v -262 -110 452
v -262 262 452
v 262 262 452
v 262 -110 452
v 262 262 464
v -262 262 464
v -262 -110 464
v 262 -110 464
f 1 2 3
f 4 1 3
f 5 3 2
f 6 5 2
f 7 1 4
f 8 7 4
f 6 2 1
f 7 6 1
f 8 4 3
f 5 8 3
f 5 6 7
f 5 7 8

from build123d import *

# Parameters (mm, degrees)
F0_W      = 500
F0_H      = 500
F1_DEPTH  = 12
F2_W      = 500
F2_H      = 50
F3_DEPTH  = 6
F6_DEPTH  = 6
F14_DEPTH = 6
F15_R     = 19.99999
F19_DEPTH = 6
F22_DEPTH = 12
F25_DEPTH = 6
F27_W     = 12
F27_H     = 320
F28_DEPTH = 44
F31_W     = 196
F31_H     = 12
F32_DEPTH = 44
F37_DEPTH = 3
F43_DEPTH = 12


# Not quite as in the source:
# - a fillet or chamfer is up to 0.001 mm smaller than in the source, because OpenCascade refuses the exact size


with BuildPart() as f1:
    # F0 (on Top) → F1 (new body)
    with BuildSketch(Plane.XY):
        Rectangle(F0_W, F0_H)
    extrude(amount=F1_DEPTH)


with BuildPart() as f3:
    # F2 (on Right) → F3 (new body, symmetric)
    with BuildSketch(Plane.YZ):
        Rectangle(F2_W, F2_H)
    extrude(amount=F3_DEPTH, both=True)


with BuildPart() as f3_1:
    # F4: moved
    add(f3.part.moved(Location((0, 0, -25))))


with BuildPart() as f6:
    # F5 (on Front) → F6 (new body, symmetric)
    with BuildSketch(Plane.XZ):
        Polygon((-250, -25), (250, -25), (250, 25), (6, 25), (6, 0), (-6, 0), (-6, 25), (-250, 25), align=None)
    extrude(amount=F6_DEPTH, both=True)


with BuildPart() as f6_1:
    # F7: moved
    add(f6.part.moved(Location((0, 80, -25))))


with BuildPart() as f8_1:
    # F8: copy of F6
    add(f6_1.part)


with BuildPart() as f3_2:
    add(f3_1.part)

    # F10: cut F6
    add(f6_1.part, mode=Mode.SUBTRACT)


with BuildPart() as f11_1:
    # F11: copy of F6
    add(f6_1.part.moved(Location((0, 164, 0))))


with BuildPart() as f3_3:
    add(f3_2.part)

    # F12: cut F11_1
    add(f11_1.part, mode=Mode.SUBTRACT)


with BuildPart() as f14:
    # F13 (on Right) → F14 (new body, symmetric)
    with BuildSketch(Plane.YZ):
        Polygon((250, -50), (250, 0), (250, 452), (70, 452), (-110, 452), (-250, 100), (-250, -50), align=None)
        Polygon((0, 412), (70, 412), (140, 412), (140, 372), (0, 372), align=None, mode=Mode.SUBTRACT)
    extrude(amount=F14_DEPTH, both=True)

    # F15 (radius 20 in the source; OpenCascade refuses exactly that, so slightly less here)
    f15_edges = [f14.edges().sort_by_distance(p)[0] for p in [
        (0, 140, 372),
        (0, 140, 412),
        (0, 0, 412),
        (0, 0, 372),
    ]]
    fillet(f15_edges, radius=F15_R)


with BuildPart() as f14_1:
    # F16: moved
    add(f14.part.moved(Location((-256, 0, 0))))


with BuildPart() as f17_1:
    # F17: copy of F14
    add(f14_1.part.moved(Location((512, 0, 0))))


with BuildPart() as f19:
    # F18 (on Front) → F19 (new body, symmetric)
    with BuildSketch(Plane.XZ):
        Polygon((-262, 452), (-262, 0), (-262, -50), (262, -50), (262, 452), align=None)
    extrude(amount=F19_DEPTH, both=True)


with BuildPart() as f19_1:
    # F20: moved
    add(f19.part.moved(Location((0, 256, 0))))


with BuildPart() as f22:
    # F21 (on face) → F22 (new body)
    with BuildSketch(Plane.XY.offset(12)):
        Polygon((262, 262), (0, 262), (-262, 262), (-262, -110), (262, -110), align=None)
    extrude(amount=F22_DEPTH)


with BuildPart() as f22_1:
    # F23: moved
    add(f22.part.moved(Location((0, 0, 440))))


with BuildPart() as f25:
    # F24 (on Front) → F25 (new body, symmetric)
    with BuildSketch(Plane.XZ):
        Polygon((-250, 12), (0, 12), (250, 12), (250, 100), (-250, 100), align=None)
    extrude(amount=F25_DEPTH, both=True)


with BuildPart() as f25_1:
    # F26: moved
    add(f25.part.moved(Location((0, -244, 0))))


with BuildPart() as f28:
    # F27 (on Top) → F28 (new body)
    with BuildSketch(Plane.XY):
        with Locations((-24, -90)):
            Rectangle(F27_W, F27_H)
    extrude(amount=F28_DEPTH)


with BuildPart() as f28_1:
    # F29: moved
    add(f28.part.moved(Location((0, 0, -48))))


with BuildPart() as f30_1:
    # F30: copy of F28
    add(f28_1.part.moved(Location((-208, 0, 0))))


with BuildPart() as f32:
    # F31 (on Top) → F32 (new body)
    with BuildSketch(Plane.XY):
        with Locations((-128, -244)):
            Rectangle(F31_W, F31_H)
    extrude(amount=-F32_DEPTH)


with BuildPart() as f32_1:
    # F33: moved
    add(f32.part.moved(Location((0, 0, -4))))


with BuildPart() as f34_1:
    # F34: copy of F32
    add(f32_1.part.moved(Location((0, 308, 0))))


with BuildPart() as f35_1:
    # F35: copy of F32
    add(f32_1.part.moved(Location((256, 0, 0))))


with BuildPart() as f35_2:
    # F35: copy of F30_1
    add(f30_1.part.moved(Location((256, 0, 0))))


with BuildPart() as f35_3:
    # F35: copy of F28
    add(f28_1.part.moved(Location((256, 0, 0))))


with BuildPart() as f35_4:
    # F35: copy of F34_1
    add(f34_1.part.moved(Location((256, 0, 0))))


with BuildPart() as f37:
    # F36 (on Top) → F37 (new body)
    with BuildSketch(Plane.XY):
        Polygon((-24, -244), (-24, 0), (-24, 64), (-232, 64), (-232, -244), align=None)
    extrude(amount=F37_DEPTH)


with BuildPart() as f37_1:
    # F38: moved
    add(f37.part.moved(Location((0, 0, -44))))


with BuildPart() as f39_1:
    # F39: copy of F37
    add(f37_1.part.moved(Location((256, 0, 0))))


with BuildPart() as f30_1_1:
    add(f30_1.part)

    # F40: cut F37
    add(f37_1.part, mode=Mode.SUBTRACT)


with BuildPart() as f32_2:
    add(f32_1.part)

    # F40: cut F37
    add(f37_1.part, mode=Mode.SUBTRACT)


with BuildPart() as f28_2:
    add(f28_1.part)

    # F40: cut F37
    add(f37_1.part, mode=Mode.SUBTRACT)


with BuildPart() as f34_1_1:
    add(f34_1.part)

    # F40: cut F37
    add(f37_1.part, mode=Mode.SUBTRACT)


with BuildPart() as f35_1_1:
    add(f35_1.part)

    # F41: cut F39_1
    add(f39_1.part, mode=Mode.SUBTRACT)


with BuildPart() as f35_3_1:
    add(f35_3.part)

    # F41: cut F39_1
    add(f39_1.part, mode=Mode.SUBTRACT)


with BuildPart() as f35_4_1:
    add(f35_4.part)

    # F41: cut F39_1
    add(f39_1.part, mode=Mode.SUBTRACT)


with BuildPart() as f35_2_1:
    add(f35_2.part)

    # F41: cut F39_1
    add(f39_1.part, mode=Mode.SUBTRACT)


with BuildPart() as f43:
    # F42 (on Front) → F43 (new body)
    with BuildSketch(Plane.XZ):
        Polygon((0, 12), (0, 0), (0, -50), (262, -50), (262, 12), align=None)
    extrude(amount=F43_DEPTH)


with BuildPart() as f43_1:
    # F44: moved
    add(f43.part.moved(Location((0, -250, 0))))


with BuildPart() as f45_1:
    # F45: copy of F43
    add(f43_1.part.moved(Location((-262, 0, 0))))


solid = f22_1.part
